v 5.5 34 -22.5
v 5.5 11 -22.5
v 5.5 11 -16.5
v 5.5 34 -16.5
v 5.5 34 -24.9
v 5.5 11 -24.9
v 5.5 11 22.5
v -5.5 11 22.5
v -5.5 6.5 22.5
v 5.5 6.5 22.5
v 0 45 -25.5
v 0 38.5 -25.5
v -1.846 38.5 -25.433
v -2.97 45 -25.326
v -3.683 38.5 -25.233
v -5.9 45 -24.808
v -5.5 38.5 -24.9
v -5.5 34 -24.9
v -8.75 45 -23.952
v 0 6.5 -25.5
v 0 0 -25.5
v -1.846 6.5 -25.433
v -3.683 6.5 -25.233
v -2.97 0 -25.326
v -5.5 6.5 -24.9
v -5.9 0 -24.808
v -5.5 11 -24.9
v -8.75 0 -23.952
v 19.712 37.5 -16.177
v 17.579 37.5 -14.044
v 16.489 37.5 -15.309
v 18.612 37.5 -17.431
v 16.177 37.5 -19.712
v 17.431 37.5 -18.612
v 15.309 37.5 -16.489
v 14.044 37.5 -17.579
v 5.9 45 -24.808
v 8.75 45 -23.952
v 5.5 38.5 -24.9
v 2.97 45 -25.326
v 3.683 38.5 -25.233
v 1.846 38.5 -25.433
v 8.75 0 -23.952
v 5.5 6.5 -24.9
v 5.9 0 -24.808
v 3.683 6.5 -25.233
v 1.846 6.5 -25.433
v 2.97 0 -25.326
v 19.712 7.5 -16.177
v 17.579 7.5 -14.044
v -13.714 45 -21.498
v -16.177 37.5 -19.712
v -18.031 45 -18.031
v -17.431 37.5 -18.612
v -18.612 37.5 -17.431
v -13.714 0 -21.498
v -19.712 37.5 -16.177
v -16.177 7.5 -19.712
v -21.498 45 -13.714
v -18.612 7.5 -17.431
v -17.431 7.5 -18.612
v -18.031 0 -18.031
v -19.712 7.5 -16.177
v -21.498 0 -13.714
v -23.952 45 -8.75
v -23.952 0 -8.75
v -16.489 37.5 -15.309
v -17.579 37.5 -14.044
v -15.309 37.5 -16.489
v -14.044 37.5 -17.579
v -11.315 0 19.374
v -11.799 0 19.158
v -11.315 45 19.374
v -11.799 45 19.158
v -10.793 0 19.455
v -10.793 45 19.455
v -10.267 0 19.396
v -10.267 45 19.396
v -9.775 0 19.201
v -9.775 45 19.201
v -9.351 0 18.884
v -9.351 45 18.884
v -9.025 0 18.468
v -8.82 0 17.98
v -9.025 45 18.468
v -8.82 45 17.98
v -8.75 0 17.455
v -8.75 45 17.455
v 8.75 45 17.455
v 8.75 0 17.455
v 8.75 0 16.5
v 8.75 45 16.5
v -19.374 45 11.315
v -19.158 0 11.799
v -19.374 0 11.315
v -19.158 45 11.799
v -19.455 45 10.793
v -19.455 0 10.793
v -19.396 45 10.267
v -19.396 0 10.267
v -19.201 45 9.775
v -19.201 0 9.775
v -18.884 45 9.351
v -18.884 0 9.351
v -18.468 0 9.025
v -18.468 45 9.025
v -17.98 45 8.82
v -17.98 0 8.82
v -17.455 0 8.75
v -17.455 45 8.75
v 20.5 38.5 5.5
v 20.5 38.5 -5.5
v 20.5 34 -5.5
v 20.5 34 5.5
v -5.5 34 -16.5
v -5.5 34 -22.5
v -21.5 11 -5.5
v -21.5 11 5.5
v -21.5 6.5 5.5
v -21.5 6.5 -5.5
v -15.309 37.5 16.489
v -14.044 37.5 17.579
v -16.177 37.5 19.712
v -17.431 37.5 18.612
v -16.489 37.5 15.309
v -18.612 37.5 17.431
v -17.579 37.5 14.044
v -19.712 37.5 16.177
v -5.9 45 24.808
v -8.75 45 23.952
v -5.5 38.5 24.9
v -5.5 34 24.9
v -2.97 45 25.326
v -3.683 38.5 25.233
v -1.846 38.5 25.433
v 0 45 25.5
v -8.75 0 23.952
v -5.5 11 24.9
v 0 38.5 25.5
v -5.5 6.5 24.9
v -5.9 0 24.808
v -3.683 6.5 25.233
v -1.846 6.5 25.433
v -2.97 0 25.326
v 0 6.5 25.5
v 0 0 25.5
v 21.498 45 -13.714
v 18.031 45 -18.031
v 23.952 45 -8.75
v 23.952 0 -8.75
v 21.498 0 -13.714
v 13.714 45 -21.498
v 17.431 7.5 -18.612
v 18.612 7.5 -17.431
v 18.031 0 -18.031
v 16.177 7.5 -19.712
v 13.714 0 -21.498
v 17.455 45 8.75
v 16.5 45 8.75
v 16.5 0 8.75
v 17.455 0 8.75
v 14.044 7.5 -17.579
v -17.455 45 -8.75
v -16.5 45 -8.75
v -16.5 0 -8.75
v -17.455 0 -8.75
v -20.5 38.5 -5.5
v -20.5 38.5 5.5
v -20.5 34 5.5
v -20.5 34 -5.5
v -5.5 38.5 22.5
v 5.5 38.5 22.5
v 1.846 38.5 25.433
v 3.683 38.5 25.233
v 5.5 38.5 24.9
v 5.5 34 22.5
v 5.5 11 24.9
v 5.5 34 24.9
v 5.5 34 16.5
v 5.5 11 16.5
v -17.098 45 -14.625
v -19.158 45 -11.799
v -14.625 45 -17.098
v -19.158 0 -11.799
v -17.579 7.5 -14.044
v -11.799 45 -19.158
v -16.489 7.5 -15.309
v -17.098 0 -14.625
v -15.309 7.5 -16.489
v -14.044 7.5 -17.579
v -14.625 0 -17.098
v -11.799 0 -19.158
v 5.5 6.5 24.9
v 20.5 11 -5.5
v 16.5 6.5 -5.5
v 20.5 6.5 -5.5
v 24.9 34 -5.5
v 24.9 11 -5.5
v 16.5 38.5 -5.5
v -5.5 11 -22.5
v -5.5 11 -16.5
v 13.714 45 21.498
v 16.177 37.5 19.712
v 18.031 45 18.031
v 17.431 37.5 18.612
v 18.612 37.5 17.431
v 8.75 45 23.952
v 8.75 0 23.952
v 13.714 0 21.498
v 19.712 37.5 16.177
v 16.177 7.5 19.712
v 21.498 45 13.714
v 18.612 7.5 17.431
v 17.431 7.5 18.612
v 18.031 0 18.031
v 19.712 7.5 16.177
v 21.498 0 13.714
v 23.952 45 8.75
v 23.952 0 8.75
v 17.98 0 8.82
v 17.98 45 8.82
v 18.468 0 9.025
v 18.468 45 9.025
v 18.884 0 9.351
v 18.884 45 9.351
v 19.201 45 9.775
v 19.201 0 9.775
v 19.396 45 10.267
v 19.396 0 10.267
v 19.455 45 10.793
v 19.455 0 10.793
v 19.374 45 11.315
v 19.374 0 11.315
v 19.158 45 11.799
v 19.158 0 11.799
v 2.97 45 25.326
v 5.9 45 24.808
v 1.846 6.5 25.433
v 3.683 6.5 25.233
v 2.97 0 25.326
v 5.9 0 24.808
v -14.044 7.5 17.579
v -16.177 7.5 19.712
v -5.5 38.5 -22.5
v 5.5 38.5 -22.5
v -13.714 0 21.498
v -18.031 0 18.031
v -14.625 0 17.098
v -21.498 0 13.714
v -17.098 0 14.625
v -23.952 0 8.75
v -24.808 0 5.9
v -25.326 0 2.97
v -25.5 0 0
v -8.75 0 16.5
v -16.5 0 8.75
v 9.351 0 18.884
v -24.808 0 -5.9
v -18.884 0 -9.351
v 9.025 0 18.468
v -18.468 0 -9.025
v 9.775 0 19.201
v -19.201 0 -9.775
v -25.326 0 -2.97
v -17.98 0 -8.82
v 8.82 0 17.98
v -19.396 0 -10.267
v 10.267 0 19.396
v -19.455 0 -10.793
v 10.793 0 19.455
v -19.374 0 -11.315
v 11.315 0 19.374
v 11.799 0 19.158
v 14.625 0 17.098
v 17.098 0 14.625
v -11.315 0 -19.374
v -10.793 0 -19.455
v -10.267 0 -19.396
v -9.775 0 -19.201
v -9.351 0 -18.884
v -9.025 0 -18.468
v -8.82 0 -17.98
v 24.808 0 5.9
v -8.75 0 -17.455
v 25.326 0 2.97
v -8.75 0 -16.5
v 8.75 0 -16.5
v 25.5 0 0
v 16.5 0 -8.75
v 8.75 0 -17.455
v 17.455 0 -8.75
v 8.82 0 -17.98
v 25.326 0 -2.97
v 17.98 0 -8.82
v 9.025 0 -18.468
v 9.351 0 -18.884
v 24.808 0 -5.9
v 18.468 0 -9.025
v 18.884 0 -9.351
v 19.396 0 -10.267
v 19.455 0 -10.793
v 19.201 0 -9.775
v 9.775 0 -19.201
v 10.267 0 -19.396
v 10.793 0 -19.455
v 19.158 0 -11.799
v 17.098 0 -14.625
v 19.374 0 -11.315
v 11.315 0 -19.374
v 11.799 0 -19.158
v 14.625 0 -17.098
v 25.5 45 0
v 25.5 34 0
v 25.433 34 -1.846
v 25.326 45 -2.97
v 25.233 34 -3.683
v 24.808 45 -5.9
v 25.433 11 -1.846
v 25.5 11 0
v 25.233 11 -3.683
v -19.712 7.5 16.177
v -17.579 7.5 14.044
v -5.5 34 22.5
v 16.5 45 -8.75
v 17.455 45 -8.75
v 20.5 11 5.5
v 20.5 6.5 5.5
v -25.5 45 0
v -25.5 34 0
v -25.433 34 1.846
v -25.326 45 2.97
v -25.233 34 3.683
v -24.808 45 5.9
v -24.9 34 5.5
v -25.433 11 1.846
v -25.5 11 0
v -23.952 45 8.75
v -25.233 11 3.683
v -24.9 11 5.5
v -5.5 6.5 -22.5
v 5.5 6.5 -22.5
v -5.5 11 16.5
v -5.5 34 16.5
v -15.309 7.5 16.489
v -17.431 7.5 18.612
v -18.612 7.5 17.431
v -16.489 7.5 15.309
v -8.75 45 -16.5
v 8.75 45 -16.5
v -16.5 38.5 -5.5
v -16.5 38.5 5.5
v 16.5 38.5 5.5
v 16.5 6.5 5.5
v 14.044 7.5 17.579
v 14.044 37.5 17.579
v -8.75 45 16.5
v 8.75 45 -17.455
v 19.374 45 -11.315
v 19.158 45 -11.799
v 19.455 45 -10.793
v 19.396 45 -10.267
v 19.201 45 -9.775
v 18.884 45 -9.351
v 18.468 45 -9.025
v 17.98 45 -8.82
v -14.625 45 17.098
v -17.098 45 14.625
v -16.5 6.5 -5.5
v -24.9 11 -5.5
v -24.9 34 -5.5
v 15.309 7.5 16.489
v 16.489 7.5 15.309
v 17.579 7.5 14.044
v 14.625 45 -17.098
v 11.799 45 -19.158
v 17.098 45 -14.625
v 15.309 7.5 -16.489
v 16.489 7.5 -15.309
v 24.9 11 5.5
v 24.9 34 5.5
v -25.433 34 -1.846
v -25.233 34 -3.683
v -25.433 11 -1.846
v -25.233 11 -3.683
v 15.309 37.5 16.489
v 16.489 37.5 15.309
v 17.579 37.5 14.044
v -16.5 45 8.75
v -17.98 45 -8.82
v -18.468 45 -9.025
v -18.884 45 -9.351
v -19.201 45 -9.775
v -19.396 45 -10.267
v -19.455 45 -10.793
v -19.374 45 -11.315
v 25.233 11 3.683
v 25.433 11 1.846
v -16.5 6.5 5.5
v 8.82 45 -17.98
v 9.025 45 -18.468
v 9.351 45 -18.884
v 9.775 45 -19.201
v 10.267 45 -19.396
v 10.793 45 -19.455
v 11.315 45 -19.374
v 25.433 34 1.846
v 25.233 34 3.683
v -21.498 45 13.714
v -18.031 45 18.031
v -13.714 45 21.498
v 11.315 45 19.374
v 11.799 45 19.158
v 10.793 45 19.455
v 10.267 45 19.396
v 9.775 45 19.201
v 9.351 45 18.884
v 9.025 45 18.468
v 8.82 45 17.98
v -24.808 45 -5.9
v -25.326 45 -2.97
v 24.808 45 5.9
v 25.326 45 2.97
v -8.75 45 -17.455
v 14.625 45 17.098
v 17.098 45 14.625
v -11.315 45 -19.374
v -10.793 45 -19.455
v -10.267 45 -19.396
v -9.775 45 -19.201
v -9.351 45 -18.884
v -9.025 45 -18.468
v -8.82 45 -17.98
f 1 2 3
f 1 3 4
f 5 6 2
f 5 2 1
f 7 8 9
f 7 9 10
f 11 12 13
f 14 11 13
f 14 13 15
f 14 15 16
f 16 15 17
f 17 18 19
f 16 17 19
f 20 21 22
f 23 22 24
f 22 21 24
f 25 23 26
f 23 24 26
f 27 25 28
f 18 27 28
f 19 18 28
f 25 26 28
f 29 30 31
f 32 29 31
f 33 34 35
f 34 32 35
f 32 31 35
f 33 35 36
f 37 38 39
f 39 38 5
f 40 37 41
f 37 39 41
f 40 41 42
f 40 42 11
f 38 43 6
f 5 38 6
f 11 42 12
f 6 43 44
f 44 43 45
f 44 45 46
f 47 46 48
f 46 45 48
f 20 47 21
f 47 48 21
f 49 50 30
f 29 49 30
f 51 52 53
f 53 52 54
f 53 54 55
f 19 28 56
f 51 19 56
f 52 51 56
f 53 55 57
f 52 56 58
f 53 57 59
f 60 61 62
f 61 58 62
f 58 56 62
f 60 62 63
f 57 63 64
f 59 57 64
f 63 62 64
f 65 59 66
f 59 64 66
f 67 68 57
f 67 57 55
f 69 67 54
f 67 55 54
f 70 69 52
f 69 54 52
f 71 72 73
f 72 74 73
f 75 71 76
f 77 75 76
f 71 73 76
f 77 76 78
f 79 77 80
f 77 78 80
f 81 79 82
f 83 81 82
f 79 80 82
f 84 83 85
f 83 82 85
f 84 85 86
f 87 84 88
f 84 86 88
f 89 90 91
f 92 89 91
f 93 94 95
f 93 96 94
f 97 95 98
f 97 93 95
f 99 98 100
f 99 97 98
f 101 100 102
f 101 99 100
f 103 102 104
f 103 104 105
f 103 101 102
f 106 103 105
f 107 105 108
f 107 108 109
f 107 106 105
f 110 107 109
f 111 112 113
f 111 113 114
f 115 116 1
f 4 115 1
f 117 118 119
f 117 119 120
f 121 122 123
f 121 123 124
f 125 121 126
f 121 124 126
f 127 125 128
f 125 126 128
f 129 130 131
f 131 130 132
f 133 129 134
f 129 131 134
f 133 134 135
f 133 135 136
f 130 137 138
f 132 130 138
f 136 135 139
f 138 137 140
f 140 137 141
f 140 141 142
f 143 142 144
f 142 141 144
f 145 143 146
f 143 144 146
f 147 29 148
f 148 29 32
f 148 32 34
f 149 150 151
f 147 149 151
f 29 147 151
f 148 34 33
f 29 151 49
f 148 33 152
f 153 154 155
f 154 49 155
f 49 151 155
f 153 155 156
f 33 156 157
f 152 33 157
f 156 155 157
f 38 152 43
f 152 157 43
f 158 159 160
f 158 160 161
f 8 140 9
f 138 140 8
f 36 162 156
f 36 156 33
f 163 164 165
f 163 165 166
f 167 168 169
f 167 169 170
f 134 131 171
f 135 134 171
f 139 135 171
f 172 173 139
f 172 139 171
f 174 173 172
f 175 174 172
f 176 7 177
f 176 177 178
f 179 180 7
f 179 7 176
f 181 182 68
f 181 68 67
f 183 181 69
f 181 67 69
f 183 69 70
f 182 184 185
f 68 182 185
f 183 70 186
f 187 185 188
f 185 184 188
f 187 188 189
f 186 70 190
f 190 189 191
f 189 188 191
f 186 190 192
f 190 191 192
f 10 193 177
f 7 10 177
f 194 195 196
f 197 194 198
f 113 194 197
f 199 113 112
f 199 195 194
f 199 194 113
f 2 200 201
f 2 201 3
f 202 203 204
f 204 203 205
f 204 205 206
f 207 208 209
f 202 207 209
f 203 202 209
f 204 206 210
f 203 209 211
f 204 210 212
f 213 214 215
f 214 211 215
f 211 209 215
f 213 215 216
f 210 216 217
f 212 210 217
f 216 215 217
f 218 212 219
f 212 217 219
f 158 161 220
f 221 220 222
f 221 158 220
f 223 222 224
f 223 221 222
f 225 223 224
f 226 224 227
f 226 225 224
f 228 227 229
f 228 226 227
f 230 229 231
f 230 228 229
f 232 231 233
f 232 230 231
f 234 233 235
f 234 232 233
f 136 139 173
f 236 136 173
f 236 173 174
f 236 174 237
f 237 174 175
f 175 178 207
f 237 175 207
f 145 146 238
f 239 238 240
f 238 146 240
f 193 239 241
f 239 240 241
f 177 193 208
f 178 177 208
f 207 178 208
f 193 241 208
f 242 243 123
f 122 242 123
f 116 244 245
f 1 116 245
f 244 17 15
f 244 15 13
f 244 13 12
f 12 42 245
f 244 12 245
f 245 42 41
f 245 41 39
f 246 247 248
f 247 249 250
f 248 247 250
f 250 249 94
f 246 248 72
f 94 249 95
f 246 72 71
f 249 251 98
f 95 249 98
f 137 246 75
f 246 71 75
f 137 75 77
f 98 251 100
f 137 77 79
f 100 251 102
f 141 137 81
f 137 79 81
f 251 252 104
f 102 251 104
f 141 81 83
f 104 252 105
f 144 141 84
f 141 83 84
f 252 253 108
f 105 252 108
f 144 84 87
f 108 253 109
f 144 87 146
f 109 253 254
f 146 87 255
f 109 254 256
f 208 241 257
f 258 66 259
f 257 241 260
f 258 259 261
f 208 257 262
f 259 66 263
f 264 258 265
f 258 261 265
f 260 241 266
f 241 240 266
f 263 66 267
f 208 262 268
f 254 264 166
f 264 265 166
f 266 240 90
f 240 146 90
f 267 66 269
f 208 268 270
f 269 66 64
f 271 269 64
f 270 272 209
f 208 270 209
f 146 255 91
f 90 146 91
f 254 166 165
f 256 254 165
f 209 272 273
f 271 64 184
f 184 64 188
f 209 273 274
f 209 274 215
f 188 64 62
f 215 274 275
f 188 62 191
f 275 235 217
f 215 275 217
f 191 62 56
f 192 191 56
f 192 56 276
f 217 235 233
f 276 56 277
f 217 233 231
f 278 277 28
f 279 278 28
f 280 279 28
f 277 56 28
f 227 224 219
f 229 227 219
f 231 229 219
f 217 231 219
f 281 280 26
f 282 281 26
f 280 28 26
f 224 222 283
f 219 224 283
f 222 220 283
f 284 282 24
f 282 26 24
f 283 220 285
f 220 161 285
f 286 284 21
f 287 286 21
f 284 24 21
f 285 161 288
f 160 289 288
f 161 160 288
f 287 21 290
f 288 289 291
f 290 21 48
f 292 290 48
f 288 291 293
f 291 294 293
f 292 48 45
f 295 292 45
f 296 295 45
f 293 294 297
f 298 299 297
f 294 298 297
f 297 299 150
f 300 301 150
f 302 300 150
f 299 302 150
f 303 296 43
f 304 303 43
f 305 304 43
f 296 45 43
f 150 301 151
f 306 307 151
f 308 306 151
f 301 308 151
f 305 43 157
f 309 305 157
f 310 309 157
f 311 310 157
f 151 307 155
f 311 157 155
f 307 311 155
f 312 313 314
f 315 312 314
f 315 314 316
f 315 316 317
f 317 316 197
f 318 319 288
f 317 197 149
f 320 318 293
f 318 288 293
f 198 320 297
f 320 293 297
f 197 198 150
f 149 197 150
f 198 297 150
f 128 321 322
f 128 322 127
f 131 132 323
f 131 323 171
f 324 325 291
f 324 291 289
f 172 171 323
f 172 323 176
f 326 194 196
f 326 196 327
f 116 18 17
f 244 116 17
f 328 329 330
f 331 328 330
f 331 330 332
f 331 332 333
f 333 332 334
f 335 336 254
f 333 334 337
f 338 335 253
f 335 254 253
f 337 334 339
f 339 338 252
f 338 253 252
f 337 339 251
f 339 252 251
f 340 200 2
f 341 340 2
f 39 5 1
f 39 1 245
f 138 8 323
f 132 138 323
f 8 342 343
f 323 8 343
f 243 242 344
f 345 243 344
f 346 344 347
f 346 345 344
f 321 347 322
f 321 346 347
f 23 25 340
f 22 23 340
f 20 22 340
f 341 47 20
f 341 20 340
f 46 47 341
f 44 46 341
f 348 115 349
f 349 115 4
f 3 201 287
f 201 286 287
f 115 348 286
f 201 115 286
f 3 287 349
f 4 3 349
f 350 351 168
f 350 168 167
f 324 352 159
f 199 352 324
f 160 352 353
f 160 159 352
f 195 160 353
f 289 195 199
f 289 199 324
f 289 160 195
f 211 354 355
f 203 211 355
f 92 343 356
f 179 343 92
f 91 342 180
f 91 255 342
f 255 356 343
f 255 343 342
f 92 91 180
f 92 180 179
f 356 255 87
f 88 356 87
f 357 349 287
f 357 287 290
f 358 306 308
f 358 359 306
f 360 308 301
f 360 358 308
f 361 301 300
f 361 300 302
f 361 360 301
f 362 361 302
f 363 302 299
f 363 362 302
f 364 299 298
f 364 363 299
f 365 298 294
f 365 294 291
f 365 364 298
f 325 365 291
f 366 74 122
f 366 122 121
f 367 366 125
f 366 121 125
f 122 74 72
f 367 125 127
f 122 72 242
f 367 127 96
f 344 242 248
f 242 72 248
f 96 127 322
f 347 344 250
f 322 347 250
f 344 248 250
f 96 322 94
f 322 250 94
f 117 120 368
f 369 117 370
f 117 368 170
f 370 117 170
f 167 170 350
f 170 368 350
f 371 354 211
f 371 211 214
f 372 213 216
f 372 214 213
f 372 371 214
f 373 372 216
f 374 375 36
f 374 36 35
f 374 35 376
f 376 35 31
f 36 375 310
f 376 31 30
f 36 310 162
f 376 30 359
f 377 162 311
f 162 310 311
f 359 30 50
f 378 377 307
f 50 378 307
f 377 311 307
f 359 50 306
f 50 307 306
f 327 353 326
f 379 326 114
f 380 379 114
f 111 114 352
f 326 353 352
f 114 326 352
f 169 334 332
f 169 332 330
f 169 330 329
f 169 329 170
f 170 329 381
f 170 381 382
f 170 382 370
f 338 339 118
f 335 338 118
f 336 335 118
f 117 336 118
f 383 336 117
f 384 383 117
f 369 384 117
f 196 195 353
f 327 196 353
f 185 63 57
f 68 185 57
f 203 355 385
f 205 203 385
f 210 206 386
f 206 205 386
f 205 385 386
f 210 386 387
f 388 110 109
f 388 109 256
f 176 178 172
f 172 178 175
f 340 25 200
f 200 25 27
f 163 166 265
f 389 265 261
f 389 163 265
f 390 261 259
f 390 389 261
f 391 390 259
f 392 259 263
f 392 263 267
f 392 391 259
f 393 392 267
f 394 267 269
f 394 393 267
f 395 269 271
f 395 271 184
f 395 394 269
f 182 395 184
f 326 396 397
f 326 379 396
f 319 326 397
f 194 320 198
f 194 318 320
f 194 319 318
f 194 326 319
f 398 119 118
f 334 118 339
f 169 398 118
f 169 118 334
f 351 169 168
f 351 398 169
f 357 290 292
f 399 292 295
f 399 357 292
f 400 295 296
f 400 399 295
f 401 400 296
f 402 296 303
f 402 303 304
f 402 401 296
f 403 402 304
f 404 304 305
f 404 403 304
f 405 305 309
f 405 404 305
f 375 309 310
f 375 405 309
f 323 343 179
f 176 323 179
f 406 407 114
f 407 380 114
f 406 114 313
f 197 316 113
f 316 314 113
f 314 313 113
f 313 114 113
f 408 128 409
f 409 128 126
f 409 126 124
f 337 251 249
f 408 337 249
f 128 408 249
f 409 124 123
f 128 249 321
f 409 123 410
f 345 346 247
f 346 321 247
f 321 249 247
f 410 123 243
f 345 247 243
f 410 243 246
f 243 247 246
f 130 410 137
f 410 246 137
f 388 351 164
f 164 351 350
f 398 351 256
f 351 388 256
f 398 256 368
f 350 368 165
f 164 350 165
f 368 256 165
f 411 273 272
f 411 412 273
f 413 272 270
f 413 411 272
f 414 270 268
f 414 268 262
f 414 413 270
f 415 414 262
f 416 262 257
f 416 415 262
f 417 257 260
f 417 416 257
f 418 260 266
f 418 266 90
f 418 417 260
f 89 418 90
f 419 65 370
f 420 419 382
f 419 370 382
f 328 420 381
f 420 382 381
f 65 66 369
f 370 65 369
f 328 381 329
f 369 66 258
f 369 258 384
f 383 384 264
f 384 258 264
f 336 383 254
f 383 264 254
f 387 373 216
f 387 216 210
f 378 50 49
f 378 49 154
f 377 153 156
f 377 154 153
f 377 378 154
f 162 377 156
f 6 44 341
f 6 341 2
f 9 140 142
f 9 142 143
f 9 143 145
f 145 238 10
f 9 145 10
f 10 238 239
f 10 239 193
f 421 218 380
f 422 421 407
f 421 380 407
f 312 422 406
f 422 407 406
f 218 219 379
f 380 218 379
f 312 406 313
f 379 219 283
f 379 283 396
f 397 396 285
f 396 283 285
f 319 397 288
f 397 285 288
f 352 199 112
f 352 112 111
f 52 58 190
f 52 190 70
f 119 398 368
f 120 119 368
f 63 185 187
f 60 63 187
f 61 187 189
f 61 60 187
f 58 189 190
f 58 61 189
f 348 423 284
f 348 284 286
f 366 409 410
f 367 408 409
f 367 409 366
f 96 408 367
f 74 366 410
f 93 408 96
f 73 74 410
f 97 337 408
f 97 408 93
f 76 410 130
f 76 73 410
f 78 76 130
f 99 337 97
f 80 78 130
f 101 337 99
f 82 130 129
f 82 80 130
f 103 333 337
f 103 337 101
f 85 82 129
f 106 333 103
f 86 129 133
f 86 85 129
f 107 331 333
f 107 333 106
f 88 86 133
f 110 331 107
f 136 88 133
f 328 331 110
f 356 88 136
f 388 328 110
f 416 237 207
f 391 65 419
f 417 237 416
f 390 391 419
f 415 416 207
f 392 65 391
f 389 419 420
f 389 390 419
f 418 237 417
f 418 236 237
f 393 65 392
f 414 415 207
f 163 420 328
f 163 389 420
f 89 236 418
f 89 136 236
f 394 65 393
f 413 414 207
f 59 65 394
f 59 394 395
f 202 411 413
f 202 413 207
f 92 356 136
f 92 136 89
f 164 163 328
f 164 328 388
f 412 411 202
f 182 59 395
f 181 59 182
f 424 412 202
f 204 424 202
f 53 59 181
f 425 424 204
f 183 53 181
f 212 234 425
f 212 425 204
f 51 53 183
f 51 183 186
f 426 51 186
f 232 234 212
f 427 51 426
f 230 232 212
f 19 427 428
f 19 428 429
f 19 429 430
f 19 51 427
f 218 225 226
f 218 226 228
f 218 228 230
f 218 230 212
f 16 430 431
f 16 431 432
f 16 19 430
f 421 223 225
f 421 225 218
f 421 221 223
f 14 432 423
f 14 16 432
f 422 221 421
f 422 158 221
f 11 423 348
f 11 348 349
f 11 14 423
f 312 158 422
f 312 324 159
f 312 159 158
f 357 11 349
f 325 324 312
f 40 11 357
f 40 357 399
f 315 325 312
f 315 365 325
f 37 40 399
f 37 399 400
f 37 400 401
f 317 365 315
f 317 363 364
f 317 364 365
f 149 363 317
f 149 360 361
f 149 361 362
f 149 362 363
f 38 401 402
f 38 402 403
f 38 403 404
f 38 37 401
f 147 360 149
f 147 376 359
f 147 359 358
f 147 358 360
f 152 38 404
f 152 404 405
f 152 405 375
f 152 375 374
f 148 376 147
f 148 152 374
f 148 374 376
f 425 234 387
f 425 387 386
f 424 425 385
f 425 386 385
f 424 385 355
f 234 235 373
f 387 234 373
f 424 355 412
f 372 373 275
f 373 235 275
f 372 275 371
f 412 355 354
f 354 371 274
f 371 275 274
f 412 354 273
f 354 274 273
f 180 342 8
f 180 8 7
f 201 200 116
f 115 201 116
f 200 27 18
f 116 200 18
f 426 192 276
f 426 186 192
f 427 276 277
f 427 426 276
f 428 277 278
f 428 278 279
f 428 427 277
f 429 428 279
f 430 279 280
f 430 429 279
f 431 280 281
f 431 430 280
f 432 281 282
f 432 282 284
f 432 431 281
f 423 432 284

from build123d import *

# Parameters (mm, degrees)
SKETCH1_R                = 25.5
BOSS_EXTRUDE1_DEPTH      = 45
FILLET1_R                = 2
CUT_EXTRUDE1_DEPTH       = 58.66714836
CUT_EXTRUDE1_DEPTH_BACK  = 58.66714836
CUT_EXTRUDE2_DEPTH       = 58.66714836
CUT_EXTRUDE2_DEPTH_BACK  = 58.66714836
CUT_EXTRUDE3_DEPTH       = 58.66714836
CUT_EXTRUDE3_DEPTH_BACK  = 58.66714836
CUT_EXTRUDE4_DEPTH       = 58.66714836
CUT_EXTRUDE4_DEPTH_BACK  = 58.66714836
SKETCH10_W               = 11
SKETCH10_H               = 4.5
CUT_EXTRUDE11_DEPTH      = 5
SKETCH6_W                = 11
SKETCH6_H                = 4.5
CUT_EXTRUDE12_DEPTH      = 4
SKETCH7_W                = 11
SKETCH7_H                = 4.5
CUT_EXTRUDE13_DEPTH      = 4
SKETCH11_W               = 11
SKETCH11_H               = 4.5
CUT_EXTRUDE14_DEPTH      = 3
CUT_EXTRUDE17_DEPTH      = 3
CUT_EXTRUDE17_DEPTH_BACK = 3
SKETCH13_W               = 11
SKETCH13_H               = 4.5


with BuildPart() as part:
    # Sketch1 → Boss-Extrude1 (new body)
    with BuildSketch(Plane(origin=(0, 0, 0), x_dir=(1, 0, 0), z_dir=(0, 1, 0))):
        Circle(SKETCH1_R)
        with BuildLine():
            Line((-8.75, -16.500006), (-8.75, -20.72890494))
            ThreePointArc((-8.75, -20.72890494), (-15.909902577, -15.909902577), (-20.72890494, -8.75))
            Line((-20.72890494, -8.75), (-16.5, -8.75))
            Line((-16.5, -8.75), (-16.5, 8.75))
            Line((-16.5, 8.75), (-20.72890494, 8.75))
            ThreePointArc((-20.72890494, 8.75), (-15.909902577, 15.909902577), (-8.75, 20.72890494))
            Line((-8.75, 20.72890494), (-8.75, 16.5))
            Line((-8.75, 16.5), (8.75, 16.5))
            Line((8.75, 16.5), (8.75, 20.72890494))
            ThreePointArc((8.75, 20.72890494), (15.909902577, 15.909902577), (20.72890494, 8.75))
            Line((20.72890494, 8.75), (16.5, 8.75))
            Line((16.5, 8.75), (16.5, -8.75))
            Line((16.5, -8.75), (20.72890494, -8.75))
            ThreePointArc((20.72890494, -8.75), (15.909902577, -15.909902577), (8.75, -20.72890494))
            Line((8.75, -20.72890494), (8.75, -16.500006))
            Line((8.75, -16.500006), (-8.75, -16.500006))
        make_face(mode=Mode.SUBTRACT)
    extrude(amount=BOSS_EXTRUDE1_DEPTH)

    # Fillet1
    fillet1_edges = [part.edges().sort_by_distance(p)[0] for p in [
        (20.72890494, 22.5, -8.75),
        (20.72890494, 22.5, 8.75),
        (8.75, 22.5, 20.72890494),
        (-8.75, 22.5, -20.72890494),
        (8.75, 22.5, -20.72890494),
        (-8.75, 22.5, 20.72890494),
        (-20.72890494, 22.5, 8.75),
        (-20.72890494, 22.5, -8.75),
    ]]
    fillet(fillet1_edges, radius=FILLET1_R)

    # Sketch2 → Cut-Extrude1 (cut, two sides: drawn at the far end of the back side and taken through both)
    with BuildSketch(Plane(origin=(0, 0, 0), x_dir=(-0.7071067811865477, 0, -0.7071067811865475), z_dir=(0.7071067811865475, 0, -0.7071067811865477)).offset(-CUT_EXTRUDE1_DEPTH_BACK)):
        Polygon((0, 7.5), (2.5, 7.5), (2.5, 37.5), (-2.5, 37.5), (-2.5, 7.5), align=None)
    extrude(amount=CUT_EXTRUDE1_DEPTH + CUT_EXTRUDE1_DEPTH_BACK, mode=Mode.SUBTRACT)

    # Sketch3 → Cut-Extrude2 (cut, two sides: drawn at the far end of the back side and taken through both)
    with BuildSketch(Plane(origin=(0, 0, 0), x_dir=(0.7071067811865476, 0, -0.7071067811865476), z_dir=(0.7071067811865476, 0, 0.7071067811865476)).offset(-CUT_EXTRUDE2_DEPTH_BACK)):
        Polygon((2.5, 7.5), (2.5, 37.5), (-2.5, 37.5), (-2.5, 7.5), (0, 7.5), align=None)
    extrude(amount=CUT_EXTRUDE2_DEPTH + CUT_EXTRUDE2_DEPTH_BACK, mode=Mode.SUBTRACT)

    # Sketch4 → Cut-Extrude3 (cut, two sides: drawn at the far end of the back side and taken through both)
    with BuildSketch(Plane.XY.offset(-CUT_EXTRUDE3_DEPTH_BACK)):
        Polygon((5.5, 34), (-5.5, 34), (-5.5, 11), (0, 11), (5.5, 11), align=None)
    extrude(amount=CUT_EXTRUDE3_DEPTH + CUT_EXTRUDE3_DEPTH_BACK, mode=Mode.SUBTRACT)

    # Sketch5 → Cut-Extrude4 (cut, two sides: drawn at the far end of the back side and taken through both)
    with BuildSketch(Plane(origin=(0, 0, 0), x_dir=(0, 0, -1), z_dir=(1, 0, 0)).offset(-CUT_EXTRUDE4_DEPTH_BACK)):
        Polygon((0, 11), (5.5, 11), (5.5, 34), (-5.5, 34), (-5.5, 11), align=None)
    extrude(amount=CUT_EXTRUDE4_DEPTH + CUT_EXTRUDE4_DEPTH_BACK, mode=Mode.SUBTRACT)

    # Sketch10 → Cut-Extrude11 (cut)
    with BuildSketch(Plane(origin=(-16.5, 0, 0), x_dir=(0, 0, -1), z_dir=(1, 0, 0))):
        with Locations((0, 8.75)):
            Rectangle(SKETCH10_W, SKETCH10_H)
    extrude(amount=-CUT_EXTRUDE11_DEPTH, mode=Mode.SUBTRACT)

    # Sketch6 → Cut-Extrude12 (cut)
    with BuildSketch(Plane.ZY.offset(-16.5)):
        with Locations((0, 36.25)):
            Rectangle(SKETCH6_W, SKETCH6_H)
        with Locations((0, 8.75)):
            Rectangle(SKETCH6_W, SKETCH6_H)
    extrude(amount=-CUT_EXTRUDE12_DEPTH, mode=Mode.SUBTRACT)

    # Sketch7 → Cut-Extrude13 (cut)
    with BuildSketch(Plane(origin=(-16.5, 0, 0), x_dir=(0, 0, -1), z_dir=(1, 0, 0))):
        with Locations((0, 36.25)):
            Rectangle(SKETCH7_W, SKETCH7_H)
        with Locations((0, 8.75)):
            Rectangle(SKETCH7_W, SKETCH7_H)
    extrude(amount=-CUT_EXTRUDE13_DEPTH, mode=Mode.SUBTRACT)

    # Sketch11 → Cut-Extrude14 (cut)
    with BuildSketch(Plane.XY.offset(25.500000054)):
        with Locations((0, 8.75)):
            Rectangle(SKETCH11_W, SKETCH11_H)
        with Locations((0, 36.25)):
            Rectangle(SKETCH11_W, SKETCH11_H)
    extrude(amount=-CUT_EXTRUDE14_DEPTH, mode=Mode.SUBTRACT)

    # Sketch13 → Cut-Extrude17 (cut, two sides: drawn at the far end of the back side and taken through both)
    with BuildSketch(Plane.XY.offset(-25.500000054).offset(-CUT_EXTRUDE17_DEPTH_BACK)):
        with Locations((0, 36.25)):
            Rectangle(SKETCH13_W, SKETCH13_H)
        with Locations((0, 8.75)):
            Rectangle(SKETCH13_W, SKETCH13_H)
    extrude(amount=CUT_EXTRUDE17_DEPTH + CUT_EXTRUDE17_DEPTH_BACK, mode=Mode.SUBTRACT)


solid = part.part
